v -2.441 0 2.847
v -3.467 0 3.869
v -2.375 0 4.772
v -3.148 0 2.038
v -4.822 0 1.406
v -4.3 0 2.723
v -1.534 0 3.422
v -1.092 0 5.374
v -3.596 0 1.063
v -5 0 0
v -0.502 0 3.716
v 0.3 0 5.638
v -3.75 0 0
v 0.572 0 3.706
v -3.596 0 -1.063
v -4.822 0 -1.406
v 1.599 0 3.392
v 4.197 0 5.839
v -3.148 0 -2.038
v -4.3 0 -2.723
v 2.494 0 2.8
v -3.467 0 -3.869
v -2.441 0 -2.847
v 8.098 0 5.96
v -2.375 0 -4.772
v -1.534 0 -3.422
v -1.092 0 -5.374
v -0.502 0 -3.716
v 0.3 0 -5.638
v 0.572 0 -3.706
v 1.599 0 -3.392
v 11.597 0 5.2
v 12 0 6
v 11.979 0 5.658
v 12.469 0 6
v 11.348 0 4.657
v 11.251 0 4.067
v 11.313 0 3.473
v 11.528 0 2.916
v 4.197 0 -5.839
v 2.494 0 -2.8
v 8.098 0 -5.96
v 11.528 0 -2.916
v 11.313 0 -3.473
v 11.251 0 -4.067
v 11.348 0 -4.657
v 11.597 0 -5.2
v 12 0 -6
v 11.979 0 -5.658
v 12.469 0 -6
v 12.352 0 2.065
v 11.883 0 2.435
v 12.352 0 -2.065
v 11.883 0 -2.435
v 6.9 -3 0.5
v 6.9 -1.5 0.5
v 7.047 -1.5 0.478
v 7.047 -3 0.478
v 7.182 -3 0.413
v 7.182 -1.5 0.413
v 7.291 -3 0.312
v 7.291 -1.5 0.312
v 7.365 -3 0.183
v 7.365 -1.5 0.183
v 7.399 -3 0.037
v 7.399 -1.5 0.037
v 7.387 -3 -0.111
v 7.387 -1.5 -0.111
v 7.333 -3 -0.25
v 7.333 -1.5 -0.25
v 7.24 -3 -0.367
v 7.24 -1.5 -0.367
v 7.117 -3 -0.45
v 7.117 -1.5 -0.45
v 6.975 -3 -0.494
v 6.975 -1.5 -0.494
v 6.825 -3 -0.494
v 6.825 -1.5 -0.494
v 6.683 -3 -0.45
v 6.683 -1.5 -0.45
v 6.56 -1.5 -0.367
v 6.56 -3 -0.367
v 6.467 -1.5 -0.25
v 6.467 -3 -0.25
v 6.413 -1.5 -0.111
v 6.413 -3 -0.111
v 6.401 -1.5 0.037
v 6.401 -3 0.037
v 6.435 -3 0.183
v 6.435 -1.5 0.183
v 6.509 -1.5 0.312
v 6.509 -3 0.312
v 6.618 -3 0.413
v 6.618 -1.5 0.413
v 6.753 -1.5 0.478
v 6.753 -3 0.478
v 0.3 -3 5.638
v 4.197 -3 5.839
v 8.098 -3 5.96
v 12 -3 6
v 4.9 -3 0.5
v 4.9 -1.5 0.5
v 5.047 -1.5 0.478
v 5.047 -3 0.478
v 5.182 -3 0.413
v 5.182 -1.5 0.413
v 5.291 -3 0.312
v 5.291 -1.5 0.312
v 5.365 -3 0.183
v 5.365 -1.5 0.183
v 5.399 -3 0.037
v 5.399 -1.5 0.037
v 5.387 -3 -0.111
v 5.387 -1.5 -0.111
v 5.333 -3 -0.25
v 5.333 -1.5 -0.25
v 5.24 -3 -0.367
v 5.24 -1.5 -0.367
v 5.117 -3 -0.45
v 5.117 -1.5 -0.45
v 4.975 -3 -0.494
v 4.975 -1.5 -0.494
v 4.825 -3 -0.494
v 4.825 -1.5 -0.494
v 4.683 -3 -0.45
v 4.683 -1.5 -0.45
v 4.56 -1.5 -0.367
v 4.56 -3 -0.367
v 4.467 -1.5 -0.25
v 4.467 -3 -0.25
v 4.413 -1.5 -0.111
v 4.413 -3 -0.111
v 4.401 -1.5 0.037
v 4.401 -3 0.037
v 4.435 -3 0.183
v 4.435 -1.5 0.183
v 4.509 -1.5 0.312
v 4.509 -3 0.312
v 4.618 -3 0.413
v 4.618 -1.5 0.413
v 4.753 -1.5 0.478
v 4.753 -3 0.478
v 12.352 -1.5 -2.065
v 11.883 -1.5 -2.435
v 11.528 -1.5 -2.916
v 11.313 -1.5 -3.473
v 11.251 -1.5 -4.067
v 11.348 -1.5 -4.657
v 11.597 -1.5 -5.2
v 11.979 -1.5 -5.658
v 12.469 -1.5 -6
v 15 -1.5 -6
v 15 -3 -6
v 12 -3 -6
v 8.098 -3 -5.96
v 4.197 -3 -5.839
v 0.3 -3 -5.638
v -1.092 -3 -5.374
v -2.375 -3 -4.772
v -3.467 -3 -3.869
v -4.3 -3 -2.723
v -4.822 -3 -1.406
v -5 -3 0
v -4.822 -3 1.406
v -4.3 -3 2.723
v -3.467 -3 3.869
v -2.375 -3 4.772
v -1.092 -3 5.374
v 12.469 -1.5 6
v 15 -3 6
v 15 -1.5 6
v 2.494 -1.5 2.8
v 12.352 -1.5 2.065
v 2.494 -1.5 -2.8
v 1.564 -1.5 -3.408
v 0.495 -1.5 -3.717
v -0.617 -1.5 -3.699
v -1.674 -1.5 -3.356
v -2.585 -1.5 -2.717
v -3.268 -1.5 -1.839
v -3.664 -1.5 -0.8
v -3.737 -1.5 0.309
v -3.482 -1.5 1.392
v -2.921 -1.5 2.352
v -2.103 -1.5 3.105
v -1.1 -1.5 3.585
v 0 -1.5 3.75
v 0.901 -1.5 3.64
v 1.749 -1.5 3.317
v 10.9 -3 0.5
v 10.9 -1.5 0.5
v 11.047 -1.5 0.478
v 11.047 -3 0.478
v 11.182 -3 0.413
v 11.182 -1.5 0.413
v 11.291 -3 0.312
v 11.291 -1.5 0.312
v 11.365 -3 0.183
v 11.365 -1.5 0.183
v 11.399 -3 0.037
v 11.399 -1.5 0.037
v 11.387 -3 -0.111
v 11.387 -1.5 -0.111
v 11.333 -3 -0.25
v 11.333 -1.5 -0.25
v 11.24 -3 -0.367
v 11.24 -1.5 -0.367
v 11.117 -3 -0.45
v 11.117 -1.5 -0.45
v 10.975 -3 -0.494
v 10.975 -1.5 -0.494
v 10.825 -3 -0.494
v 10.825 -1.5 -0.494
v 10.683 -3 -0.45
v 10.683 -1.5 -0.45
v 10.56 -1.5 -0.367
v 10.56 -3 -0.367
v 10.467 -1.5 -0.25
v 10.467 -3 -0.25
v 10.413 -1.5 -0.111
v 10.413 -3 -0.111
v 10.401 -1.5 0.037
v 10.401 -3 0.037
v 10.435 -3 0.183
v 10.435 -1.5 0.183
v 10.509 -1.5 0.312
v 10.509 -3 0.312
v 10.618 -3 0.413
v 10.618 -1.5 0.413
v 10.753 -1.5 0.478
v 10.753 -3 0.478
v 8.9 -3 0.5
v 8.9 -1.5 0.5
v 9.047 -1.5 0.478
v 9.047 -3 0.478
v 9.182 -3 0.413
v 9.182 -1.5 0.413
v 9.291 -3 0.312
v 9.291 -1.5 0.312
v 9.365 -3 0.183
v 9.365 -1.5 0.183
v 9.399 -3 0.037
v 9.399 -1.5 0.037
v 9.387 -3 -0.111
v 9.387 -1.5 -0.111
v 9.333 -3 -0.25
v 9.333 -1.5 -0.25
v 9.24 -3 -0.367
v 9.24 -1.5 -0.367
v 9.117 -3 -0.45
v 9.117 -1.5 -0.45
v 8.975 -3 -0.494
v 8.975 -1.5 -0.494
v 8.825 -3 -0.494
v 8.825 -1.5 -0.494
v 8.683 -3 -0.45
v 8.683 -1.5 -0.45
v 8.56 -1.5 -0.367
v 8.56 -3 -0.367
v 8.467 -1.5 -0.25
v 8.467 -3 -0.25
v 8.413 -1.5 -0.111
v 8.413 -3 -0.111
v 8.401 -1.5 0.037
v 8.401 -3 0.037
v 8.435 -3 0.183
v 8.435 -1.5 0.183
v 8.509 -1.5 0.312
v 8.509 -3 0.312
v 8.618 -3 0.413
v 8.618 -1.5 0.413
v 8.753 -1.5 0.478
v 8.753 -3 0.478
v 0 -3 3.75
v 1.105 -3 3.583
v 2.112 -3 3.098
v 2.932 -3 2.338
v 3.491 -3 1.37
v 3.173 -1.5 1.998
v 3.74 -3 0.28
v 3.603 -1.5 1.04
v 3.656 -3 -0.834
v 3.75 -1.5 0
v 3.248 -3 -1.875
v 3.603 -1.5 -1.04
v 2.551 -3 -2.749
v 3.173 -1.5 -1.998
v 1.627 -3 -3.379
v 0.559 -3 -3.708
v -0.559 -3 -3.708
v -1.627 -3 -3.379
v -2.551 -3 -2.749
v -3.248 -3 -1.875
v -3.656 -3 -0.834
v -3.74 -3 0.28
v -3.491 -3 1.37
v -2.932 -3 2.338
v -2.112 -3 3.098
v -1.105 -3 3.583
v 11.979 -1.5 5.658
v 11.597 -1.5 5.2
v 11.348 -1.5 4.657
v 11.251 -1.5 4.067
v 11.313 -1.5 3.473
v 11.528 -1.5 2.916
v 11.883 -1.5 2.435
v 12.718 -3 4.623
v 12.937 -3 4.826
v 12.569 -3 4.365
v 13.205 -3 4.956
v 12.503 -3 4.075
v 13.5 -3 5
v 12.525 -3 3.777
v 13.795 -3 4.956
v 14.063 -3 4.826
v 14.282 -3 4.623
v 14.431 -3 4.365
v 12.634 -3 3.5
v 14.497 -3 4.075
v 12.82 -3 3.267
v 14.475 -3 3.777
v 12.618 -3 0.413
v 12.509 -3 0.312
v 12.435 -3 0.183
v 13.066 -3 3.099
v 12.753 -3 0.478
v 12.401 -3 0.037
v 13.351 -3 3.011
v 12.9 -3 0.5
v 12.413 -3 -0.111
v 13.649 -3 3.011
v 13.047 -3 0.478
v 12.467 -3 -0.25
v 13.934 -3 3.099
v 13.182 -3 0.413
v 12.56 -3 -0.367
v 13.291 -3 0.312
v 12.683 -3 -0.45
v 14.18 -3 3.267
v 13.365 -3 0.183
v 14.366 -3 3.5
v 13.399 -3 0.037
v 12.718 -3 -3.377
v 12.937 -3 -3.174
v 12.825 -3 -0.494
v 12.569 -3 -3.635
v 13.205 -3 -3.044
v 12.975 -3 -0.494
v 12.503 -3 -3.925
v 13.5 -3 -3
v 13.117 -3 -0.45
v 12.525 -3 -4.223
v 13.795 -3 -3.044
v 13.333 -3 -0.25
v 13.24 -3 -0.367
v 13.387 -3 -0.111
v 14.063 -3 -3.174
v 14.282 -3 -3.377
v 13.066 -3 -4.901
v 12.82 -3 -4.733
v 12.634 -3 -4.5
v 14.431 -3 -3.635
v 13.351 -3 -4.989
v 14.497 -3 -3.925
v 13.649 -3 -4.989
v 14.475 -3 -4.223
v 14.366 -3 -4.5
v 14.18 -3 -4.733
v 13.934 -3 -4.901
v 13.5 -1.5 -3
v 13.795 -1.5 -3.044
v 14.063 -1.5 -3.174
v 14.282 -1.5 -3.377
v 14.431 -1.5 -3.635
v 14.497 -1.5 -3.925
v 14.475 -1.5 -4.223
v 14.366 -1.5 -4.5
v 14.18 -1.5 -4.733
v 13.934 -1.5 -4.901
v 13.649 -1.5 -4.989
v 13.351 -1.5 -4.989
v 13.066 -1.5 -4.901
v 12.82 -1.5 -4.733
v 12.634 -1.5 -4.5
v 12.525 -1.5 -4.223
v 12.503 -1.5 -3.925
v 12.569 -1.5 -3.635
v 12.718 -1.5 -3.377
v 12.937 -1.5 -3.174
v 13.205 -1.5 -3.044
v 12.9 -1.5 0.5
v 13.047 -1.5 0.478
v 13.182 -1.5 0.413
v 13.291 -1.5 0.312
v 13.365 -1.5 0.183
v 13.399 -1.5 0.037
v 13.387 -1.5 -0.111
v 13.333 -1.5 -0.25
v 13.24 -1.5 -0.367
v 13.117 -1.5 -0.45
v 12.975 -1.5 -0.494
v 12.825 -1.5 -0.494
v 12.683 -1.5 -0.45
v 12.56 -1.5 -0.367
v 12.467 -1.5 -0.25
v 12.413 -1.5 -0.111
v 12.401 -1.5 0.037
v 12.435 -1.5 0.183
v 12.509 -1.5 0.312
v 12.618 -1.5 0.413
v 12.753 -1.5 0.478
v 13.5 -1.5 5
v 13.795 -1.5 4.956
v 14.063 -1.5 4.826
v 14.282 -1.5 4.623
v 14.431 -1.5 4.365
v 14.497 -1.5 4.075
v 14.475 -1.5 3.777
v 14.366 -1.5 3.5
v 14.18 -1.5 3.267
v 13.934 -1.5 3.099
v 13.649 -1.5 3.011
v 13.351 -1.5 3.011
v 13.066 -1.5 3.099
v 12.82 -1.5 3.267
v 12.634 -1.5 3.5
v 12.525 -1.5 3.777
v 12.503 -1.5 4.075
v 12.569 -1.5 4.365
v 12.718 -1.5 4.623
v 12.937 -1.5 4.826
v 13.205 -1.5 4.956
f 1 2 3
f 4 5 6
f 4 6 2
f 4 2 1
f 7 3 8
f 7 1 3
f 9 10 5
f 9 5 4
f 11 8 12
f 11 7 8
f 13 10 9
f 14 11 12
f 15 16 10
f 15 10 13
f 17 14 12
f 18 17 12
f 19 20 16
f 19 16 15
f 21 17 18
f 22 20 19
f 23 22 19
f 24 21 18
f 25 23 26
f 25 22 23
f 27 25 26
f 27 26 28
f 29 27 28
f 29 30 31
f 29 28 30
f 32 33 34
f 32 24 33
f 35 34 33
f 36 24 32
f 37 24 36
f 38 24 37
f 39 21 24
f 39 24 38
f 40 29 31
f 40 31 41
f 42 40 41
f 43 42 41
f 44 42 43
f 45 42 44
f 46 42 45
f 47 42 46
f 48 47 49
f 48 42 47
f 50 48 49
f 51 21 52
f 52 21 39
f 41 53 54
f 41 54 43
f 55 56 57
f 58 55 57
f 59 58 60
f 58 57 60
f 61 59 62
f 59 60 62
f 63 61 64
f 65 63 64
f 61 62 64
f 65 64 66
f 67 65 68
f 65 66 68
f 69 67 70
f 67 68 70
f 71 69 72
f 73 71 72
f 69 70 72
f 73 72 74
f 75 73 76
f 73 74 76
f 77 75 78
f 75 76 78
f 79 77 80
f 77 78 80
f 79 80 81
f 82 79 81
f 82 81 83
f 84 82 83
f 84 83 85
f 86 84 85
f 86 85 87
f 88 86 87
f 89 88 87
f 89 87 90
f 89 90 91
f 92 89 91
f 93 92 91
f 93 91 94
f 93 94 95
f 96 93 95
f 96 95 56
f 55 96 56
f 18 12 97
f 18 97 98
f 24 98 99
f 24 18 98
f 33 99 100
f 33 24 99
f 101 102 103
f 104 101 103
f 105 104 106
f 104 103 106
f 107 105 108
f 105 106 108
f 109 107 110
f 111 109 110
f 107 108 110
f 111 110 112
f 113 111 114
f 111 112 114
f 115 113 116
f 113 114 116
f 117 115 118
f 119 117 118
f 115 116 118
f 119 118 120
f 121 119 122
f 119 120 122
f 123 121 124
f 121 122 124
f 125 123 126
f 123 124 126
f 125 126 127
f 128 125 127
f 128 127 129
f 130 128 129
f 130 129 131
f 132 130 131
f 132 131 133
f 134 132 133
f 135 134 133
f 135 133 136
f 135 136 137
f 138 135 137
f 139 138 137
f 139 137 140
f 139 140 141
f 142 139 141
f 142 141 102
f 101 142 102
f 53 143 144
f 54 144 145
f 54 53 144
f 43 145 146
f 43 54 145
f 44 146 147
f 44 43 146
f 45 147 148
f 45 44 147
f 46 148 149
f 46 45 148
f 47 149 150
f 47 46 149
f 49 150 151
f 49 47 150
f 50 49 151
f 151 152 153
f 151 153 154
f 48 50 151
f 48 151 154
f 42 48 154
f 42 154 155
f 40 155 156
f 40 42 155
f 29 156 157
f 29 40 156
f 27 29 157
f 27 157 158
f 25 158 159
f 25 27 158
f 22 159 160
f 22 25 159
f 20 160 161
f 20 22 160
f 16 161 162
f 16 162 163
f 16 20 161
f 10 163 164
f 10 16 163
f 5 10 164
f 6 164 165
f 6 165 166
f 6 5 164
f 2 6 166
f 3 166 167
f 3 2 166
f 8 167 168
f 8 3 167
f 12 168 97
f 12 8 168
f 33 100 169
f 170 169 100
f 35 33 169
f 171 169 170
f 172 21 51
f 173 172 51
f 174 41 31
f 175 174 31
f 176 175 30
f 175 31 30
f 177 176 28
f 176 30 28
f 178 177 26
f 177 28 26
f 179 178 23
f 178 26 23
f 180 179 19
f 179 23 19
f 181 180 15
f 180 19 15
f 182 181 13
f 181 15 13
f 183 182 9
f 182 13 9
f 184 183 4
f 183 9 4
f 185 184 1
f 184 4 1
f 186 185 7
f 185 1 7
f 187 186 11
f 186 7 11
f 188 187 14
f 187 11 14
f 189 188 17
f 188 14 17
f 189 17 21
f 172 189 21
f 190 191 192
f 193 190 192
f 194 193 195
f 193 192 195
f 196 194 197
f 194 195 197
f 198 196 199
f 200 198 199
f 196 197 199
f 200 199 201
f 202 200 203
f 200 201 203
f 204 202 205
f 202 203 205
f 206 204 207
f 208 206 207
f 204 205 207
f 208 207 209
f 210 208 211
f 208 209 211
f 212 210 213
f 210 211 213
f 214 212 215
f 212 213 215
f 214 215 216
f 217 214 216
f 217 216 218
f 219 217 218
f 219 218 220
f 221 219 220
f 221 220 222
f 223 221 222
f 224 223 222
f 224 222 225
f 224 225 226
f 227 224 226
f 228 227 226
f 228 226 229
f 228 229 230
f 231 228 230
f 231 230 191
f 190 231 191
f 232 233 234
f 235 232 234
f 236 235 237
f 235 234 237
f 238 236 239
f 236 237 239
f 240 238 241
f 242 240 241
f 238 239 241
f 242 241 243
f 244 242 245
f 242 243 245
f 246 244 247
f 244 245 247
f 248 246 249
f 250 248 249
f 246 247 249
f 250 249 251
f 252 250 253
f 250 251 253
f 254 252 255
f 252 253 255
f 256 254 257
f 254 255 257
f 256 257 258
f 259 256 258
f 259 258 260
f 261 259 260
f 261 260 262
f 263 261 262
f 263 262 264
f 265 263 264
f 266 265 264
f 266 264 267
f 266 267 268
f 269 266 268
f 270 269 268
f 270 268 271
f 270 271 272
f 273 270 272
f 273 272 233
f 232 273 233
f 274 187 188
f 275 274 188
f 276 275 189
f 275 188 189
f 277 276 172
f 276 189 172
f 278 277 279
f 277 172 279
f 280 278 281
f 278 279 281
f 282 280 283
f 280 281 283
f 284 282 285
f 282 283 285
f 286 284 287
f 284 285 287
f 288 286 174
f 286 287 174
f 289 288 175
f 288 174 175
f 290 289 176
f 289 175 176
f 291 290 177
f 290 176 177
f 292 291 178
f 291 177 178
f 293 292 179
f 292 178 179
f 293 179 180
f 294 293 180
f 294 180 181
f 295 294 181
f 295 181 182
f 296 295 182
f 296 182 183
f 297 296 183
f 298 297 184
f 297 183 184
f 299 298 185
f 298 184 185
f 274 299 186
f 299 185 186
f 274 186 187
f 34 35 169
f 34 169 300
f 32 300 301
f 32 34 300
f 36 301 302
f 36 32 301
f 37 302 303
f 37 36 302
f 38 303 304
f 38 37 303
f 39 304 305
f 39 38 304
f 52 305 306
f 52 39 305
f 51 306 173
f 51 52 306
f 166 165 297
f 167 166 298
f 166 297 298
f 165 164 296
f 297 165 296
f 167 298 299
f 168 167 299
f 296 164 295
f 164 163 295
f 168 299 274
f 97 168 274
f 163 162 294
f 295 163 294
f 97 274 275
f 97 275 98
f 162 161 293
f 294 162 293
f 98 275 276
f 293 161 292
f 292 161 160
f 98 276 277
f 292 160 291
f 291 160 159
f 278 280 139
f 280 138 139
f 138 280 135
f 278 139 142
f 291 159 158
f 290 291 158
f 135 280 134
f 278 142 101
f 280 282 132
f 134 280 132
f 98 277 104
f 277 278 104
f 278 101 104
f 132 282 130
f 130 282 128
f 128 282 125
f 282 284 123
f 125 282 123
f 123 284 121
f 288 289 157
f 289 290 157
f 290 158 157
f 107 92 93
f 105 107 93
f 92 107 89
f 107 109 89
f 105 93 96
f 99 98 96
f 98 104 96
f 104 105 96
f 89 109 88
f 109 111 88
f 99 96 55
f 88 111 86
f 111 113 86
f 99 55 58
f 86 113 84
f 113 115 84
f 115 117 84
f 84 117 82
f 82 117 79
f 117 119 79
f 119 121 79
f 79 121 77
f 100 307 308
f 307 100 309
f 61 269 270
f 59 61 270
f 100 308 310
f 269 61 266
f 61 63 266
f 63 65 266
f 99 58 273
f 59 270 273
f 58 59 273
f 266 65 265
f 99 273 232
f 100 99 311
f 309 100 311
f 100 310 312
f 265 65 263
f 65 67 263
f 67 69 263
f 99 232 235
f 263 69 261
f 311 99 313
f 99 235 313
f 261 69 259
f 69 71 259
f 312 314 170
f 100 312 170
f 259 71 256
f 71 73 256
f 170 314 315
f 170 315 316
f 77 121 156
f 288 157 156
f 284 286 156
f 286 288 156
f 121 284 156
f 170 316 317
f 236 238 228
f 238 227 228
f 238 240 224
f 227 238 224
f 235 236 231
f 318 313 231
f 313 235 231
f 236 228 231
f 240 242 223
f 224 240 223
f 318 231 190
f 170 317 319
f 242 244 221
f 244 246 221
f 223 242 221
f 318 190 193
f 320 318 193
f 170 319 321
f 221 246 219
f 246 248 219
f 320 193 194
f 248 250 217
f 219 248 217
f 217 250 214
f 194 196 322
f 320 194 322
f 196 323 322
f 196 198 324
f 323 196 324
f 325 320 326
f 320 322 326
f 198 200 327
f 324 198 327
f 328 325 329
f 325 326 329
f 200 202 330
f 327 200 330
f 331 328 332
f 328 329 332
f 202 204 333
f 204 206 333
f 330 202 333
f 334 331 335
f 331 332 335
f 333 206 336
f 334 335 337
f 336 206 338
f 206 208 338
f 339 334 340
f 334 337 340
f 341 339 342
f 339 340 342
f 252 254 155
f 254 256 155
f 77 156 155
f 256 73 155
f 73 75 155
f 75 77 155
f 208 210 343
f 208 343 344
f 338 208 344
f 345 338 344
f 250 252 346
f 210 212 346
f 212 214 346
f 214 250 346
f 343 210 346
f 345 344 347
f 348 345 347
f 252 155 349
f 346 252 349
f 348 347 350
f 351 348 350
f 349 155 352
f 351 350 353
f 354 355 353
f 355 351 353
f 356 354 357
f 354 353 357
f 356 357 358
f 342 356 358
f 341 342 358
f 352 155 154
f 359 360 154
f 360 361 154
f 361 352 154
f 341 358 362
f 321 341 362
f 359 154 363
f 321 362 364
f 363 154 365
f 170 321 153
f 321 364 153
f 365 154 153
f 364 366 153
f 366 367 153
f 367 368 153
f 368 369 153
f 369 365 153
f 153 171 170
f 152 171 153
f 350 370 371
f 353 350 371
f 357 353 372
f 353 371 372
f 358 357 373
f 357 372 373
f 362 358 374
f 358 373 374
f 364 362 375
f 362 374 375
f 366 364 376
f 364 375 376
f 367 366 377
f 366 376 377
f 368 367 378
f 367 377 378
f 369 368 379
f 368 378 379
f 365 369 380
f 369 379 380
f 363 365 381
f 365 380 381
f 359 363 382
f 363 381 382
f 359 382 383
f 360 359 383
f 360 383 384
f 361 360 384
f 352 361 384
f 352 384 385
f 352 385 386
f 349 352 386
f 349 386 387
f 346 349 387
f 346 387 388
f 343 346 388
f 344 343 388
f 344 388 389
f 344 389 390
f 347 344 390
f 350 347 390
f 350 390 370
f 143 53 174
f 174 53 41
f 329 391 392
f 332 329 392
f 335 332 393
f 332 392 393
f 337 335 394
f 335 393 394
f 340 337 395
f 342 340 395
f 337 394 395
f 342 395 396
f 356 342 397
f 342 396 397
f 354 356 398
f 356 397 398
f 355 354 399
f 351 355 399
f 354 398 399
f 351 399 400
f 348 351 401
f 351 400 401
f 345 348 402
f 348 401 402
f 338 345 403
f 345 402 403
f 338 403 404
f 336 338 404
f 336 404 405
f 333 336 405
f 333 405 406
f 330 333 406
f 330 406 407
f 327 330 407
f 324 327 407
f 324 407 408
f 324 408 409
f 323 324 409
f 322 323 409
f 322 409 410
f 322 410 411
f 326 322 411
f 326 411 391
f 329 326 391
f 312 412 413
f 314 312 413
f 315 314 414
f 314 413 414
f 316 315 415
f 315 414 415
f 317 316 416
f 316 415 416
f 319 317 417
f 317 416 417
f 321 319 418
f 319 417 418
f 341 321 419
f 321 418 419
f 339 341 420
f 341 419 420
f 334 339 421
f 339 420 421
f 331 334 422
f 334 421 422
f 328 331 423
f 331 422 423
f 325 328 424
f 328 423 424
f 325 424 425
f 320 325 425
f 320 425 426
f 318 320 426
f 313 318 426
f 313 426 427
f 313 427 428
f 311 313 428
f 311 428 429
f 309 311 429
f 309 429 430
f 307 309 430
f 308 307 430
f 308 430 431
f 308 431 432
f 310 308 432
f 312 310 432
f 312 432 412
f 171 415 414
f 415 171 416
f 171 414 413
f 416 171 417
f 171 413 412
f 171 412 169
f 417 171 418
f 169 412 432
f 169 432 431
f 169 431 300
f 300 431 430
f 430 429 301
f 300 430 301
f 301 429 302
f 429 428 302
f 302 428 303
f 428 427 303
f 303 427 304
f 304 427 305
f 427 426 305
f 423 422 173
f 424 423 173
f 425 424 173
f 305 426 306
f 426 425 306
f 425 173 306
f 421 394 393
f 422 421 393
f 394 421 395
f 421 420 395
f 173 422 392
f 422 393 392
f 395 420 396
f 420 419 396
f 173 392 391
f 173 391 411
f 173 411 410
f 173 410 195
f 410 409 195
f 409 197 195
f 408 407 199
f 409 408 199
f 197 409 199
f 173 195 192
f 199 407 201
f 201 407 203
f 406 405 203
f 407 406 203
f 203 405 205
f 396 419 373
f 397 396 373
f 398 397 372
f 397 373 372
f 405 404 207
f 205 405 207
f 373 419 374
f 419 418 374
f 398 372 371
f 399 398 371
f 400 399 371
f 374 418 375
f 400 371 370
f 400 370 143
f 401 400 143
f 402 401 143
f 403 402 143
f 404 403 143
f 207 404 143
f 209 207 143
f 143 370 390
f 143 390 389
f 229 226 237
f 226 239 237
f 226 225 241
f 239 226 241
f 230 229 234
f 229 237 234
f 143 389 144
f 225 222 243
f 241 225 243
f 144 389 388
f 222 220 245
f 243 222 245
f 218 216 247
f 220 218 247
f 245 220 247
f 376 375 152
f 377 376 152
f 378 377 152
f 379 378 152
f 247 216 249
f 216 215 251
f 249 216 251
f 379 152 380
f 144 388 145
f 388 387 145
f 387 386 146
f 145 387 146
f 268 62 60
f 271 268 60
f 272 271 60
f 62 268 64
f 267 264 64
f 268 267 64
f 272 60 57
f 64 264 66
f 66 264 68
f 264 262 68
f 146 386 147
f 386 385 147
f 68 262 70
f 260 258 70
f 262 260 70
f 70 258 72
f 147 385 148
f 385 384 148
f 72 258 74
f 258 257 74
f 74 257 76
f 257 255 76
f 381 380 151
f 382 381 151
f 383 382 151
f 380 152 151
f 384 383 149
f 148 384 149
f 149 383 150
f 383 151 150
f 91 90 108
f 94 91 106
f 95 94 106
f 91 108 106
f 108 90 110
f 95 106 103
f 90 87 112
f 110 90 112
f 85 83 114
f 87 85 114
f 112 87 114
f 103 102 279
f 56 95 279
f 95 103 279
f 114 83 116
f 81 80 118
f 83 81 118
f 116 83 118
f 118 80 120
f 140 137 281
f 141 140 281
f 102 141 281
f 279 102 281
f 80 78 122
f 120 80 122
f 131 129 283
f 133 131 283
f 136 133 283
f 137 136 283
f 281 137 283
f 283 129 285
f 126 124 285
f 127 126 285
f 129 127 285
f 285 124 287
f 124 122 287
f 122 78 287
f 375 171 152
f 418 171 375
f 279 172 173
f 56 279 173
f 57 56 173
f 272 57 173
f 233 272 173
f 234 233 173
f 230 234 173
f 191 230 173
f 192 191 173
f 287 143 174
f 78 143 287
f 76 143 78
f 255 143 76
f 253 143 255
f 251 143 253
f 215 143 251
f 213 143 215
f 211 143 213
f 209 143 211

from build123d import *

# Parameters (mm, degrees)
SKETCH1_R               = 1
SKETCH1_R_2             = 2.35
BOSS_EXTRUDE1_DEPTH     = 3
ENL_V_MAT_EXTRU_1_DEPTH = 1.5
ESQUISSE3_R             = 0.5
ESQUISSE3_R_2           = 3.75
ENL_V_MAT_EXTRU_7_DEPTH = 17.224980878
ENL_V_MAT_EXTRU_8_DEPTH = 1.5


with BuildPart() as part:
    # Sketch1 → Boss-Extrude1 (new body)
    with BuildSketch(Plane(origin=(0, 0, 0), x_dir=(1, 0, 0), z_dir=(0, 1, 0))):
        with BuildLine():
            Line((15, 6), (12, 6))
            ThreePointArc((12, 6), (6.147204023, 5.909534011), (0.3, 5.638222479))
            ThreePointArc((0.3, 5.638222479), (-5, 0), (0.3, -5.638222479))
            ThreePointArc((0.3, -5.638222479), (6.147204023, -5.909534011), (12, -6))
            Line((12, -6), (15, -6))
            Line((15, -6), (15, 6))
        make_face()
        with Locations(Location((13.5, -4, 0), (0, 0, 270))):
            Circle(SKETCH1_R, mode=Mode.SUBTRACT)
        with Locations(Location((13.5, 4, 0), (0, 0, 270))):
            Circle(SKETCH1_R, mode=Mode.SUBTRACT)
        with Locations(Location((0, 0, 0), (0, 0, 270))):
            Circle(SKETCH1_R_2, mode=Mode.SUBTRACT)
    extrude(amount=-BOSS_EXTRUDE1_DEPTH)

    # Esquisse1 → Enlèv. mat.-Extru.1 (cut)
    with BuildSketch(Plane(origin=(0, 0, 0), x_dir=(1, 0, 0), z_dir=(0, 1, 0))):
        with BuildLine():
            Line((2.494493937, -2.8), (14.131406802, -1.932309126))
            add(Edge.make_bspline(
                [(14.131406802, -1.932309126), (14.497286128, -1.904835216), (14.827491954, -1.746052706), (15.157338026, -1.587443187), (15.407154881, -1.318584734), (15.656200737, -1.050556048), (15.790562016, -0.709168668), (15.92490372, -0.367831024), (15.925, 0), (15.925095847, 0.366175279), (15.791018176, 0.708007672), (15.657374187, 1.048734388), (15.407835717, 1.317851242), (15.159067388, 1.586137532), (14.828615817, 1.74551148), (14.498449498, 1.904747853), (14.131406802, 1.932309126)],
                knots=[0, 0, 0, 0.125, 0.125, 0.25, 0.25, 0.375, 0.375, 0.5, 0.5, 0.625, 0.625, 0.75, 0.75, 0.875, 0.875, 1, 1, 1], degree=2))
            Line((14.131406802, 1.932309126), (2.494493937, 2.8))
            ThreePointArc((2.494493937, 2.8), (-3.75, 0), (2.494493937, -2.8))
        make_face()
    extrude(amount=-ENL_V_MAT_EXTRU_1_DEPTH, mode=Mode.SUBTRACT)

    # Esquisse3 → Enlèv. mat.-Extru.7 (cut, through all)
    with BuildSketch(Plane(origin=(0, -1.5, 0), x_dir=(1, 0, 0), z_dir=(0, 1, 0))):
        with Locations(Location((4.9, 0, 0), (0, 0, 270))):
            Circle(ESQUISSE3_R)
        with Locations(Location((6.9, 0, 0), (0, 0, 270))):
            Circle(ESQUISSE3_R)
        with Locations(Location((8.9, 0, 0), (0, 0, 270))):
            Circle(ESQUISSE3_R)
        with Locations(Location((10.9, 0, 0), (0, 0, 270))):
            Circle(ESQUISSE3_R)
        with Locations(Location((12.9, 0, 0), (0, 0, 270))):
            Circle(ESQUISSE3_R)
        with Locations(Location((0, 0, 0), (0, 0, 270))):
            Circle(ESQUISSE3_R_2)
    extrude(amount=-ENL_V_MAT_EXTRU_7_DEPTH, mode=Mode.SUBTRACT)

    # Esquisse4 → Enlèv. mat.-Extru.8 (cut)
    with BuildSketch(Plane(origin=(0, 0, 0), x_dir=(1, 0, 0), z_dir=(0, 1, 0))):
        with BuildLine():
            Line((13.5, -1.75), (13.5, 1.75))
            ThreePointArc((13.5, 1.75), (11.25, 4), (13.5, 6.25))
            Line((13.5, 6.25), (13.5, 7.352249371))
            Line((13.5, 7.352249371), (16.575189436, 7.352249371))
            Line((16.575189436, 7.352249371), (16.575189436, -9.01785128))
            Line((16.575189436, -9.01785128), (13.5, -9.01785128))
            Line((13.5, -9.01785128), (13.5, -6.25))
            ThreePointArc((13.5, -6.25), (11.25, -4), (13.5, -1.75))
        make_face()
    extrude(amount=-ENL_V_MAT_EXTRU_8_DEPTH, mode=Mode.SUBTRACT)


solid = part.part
